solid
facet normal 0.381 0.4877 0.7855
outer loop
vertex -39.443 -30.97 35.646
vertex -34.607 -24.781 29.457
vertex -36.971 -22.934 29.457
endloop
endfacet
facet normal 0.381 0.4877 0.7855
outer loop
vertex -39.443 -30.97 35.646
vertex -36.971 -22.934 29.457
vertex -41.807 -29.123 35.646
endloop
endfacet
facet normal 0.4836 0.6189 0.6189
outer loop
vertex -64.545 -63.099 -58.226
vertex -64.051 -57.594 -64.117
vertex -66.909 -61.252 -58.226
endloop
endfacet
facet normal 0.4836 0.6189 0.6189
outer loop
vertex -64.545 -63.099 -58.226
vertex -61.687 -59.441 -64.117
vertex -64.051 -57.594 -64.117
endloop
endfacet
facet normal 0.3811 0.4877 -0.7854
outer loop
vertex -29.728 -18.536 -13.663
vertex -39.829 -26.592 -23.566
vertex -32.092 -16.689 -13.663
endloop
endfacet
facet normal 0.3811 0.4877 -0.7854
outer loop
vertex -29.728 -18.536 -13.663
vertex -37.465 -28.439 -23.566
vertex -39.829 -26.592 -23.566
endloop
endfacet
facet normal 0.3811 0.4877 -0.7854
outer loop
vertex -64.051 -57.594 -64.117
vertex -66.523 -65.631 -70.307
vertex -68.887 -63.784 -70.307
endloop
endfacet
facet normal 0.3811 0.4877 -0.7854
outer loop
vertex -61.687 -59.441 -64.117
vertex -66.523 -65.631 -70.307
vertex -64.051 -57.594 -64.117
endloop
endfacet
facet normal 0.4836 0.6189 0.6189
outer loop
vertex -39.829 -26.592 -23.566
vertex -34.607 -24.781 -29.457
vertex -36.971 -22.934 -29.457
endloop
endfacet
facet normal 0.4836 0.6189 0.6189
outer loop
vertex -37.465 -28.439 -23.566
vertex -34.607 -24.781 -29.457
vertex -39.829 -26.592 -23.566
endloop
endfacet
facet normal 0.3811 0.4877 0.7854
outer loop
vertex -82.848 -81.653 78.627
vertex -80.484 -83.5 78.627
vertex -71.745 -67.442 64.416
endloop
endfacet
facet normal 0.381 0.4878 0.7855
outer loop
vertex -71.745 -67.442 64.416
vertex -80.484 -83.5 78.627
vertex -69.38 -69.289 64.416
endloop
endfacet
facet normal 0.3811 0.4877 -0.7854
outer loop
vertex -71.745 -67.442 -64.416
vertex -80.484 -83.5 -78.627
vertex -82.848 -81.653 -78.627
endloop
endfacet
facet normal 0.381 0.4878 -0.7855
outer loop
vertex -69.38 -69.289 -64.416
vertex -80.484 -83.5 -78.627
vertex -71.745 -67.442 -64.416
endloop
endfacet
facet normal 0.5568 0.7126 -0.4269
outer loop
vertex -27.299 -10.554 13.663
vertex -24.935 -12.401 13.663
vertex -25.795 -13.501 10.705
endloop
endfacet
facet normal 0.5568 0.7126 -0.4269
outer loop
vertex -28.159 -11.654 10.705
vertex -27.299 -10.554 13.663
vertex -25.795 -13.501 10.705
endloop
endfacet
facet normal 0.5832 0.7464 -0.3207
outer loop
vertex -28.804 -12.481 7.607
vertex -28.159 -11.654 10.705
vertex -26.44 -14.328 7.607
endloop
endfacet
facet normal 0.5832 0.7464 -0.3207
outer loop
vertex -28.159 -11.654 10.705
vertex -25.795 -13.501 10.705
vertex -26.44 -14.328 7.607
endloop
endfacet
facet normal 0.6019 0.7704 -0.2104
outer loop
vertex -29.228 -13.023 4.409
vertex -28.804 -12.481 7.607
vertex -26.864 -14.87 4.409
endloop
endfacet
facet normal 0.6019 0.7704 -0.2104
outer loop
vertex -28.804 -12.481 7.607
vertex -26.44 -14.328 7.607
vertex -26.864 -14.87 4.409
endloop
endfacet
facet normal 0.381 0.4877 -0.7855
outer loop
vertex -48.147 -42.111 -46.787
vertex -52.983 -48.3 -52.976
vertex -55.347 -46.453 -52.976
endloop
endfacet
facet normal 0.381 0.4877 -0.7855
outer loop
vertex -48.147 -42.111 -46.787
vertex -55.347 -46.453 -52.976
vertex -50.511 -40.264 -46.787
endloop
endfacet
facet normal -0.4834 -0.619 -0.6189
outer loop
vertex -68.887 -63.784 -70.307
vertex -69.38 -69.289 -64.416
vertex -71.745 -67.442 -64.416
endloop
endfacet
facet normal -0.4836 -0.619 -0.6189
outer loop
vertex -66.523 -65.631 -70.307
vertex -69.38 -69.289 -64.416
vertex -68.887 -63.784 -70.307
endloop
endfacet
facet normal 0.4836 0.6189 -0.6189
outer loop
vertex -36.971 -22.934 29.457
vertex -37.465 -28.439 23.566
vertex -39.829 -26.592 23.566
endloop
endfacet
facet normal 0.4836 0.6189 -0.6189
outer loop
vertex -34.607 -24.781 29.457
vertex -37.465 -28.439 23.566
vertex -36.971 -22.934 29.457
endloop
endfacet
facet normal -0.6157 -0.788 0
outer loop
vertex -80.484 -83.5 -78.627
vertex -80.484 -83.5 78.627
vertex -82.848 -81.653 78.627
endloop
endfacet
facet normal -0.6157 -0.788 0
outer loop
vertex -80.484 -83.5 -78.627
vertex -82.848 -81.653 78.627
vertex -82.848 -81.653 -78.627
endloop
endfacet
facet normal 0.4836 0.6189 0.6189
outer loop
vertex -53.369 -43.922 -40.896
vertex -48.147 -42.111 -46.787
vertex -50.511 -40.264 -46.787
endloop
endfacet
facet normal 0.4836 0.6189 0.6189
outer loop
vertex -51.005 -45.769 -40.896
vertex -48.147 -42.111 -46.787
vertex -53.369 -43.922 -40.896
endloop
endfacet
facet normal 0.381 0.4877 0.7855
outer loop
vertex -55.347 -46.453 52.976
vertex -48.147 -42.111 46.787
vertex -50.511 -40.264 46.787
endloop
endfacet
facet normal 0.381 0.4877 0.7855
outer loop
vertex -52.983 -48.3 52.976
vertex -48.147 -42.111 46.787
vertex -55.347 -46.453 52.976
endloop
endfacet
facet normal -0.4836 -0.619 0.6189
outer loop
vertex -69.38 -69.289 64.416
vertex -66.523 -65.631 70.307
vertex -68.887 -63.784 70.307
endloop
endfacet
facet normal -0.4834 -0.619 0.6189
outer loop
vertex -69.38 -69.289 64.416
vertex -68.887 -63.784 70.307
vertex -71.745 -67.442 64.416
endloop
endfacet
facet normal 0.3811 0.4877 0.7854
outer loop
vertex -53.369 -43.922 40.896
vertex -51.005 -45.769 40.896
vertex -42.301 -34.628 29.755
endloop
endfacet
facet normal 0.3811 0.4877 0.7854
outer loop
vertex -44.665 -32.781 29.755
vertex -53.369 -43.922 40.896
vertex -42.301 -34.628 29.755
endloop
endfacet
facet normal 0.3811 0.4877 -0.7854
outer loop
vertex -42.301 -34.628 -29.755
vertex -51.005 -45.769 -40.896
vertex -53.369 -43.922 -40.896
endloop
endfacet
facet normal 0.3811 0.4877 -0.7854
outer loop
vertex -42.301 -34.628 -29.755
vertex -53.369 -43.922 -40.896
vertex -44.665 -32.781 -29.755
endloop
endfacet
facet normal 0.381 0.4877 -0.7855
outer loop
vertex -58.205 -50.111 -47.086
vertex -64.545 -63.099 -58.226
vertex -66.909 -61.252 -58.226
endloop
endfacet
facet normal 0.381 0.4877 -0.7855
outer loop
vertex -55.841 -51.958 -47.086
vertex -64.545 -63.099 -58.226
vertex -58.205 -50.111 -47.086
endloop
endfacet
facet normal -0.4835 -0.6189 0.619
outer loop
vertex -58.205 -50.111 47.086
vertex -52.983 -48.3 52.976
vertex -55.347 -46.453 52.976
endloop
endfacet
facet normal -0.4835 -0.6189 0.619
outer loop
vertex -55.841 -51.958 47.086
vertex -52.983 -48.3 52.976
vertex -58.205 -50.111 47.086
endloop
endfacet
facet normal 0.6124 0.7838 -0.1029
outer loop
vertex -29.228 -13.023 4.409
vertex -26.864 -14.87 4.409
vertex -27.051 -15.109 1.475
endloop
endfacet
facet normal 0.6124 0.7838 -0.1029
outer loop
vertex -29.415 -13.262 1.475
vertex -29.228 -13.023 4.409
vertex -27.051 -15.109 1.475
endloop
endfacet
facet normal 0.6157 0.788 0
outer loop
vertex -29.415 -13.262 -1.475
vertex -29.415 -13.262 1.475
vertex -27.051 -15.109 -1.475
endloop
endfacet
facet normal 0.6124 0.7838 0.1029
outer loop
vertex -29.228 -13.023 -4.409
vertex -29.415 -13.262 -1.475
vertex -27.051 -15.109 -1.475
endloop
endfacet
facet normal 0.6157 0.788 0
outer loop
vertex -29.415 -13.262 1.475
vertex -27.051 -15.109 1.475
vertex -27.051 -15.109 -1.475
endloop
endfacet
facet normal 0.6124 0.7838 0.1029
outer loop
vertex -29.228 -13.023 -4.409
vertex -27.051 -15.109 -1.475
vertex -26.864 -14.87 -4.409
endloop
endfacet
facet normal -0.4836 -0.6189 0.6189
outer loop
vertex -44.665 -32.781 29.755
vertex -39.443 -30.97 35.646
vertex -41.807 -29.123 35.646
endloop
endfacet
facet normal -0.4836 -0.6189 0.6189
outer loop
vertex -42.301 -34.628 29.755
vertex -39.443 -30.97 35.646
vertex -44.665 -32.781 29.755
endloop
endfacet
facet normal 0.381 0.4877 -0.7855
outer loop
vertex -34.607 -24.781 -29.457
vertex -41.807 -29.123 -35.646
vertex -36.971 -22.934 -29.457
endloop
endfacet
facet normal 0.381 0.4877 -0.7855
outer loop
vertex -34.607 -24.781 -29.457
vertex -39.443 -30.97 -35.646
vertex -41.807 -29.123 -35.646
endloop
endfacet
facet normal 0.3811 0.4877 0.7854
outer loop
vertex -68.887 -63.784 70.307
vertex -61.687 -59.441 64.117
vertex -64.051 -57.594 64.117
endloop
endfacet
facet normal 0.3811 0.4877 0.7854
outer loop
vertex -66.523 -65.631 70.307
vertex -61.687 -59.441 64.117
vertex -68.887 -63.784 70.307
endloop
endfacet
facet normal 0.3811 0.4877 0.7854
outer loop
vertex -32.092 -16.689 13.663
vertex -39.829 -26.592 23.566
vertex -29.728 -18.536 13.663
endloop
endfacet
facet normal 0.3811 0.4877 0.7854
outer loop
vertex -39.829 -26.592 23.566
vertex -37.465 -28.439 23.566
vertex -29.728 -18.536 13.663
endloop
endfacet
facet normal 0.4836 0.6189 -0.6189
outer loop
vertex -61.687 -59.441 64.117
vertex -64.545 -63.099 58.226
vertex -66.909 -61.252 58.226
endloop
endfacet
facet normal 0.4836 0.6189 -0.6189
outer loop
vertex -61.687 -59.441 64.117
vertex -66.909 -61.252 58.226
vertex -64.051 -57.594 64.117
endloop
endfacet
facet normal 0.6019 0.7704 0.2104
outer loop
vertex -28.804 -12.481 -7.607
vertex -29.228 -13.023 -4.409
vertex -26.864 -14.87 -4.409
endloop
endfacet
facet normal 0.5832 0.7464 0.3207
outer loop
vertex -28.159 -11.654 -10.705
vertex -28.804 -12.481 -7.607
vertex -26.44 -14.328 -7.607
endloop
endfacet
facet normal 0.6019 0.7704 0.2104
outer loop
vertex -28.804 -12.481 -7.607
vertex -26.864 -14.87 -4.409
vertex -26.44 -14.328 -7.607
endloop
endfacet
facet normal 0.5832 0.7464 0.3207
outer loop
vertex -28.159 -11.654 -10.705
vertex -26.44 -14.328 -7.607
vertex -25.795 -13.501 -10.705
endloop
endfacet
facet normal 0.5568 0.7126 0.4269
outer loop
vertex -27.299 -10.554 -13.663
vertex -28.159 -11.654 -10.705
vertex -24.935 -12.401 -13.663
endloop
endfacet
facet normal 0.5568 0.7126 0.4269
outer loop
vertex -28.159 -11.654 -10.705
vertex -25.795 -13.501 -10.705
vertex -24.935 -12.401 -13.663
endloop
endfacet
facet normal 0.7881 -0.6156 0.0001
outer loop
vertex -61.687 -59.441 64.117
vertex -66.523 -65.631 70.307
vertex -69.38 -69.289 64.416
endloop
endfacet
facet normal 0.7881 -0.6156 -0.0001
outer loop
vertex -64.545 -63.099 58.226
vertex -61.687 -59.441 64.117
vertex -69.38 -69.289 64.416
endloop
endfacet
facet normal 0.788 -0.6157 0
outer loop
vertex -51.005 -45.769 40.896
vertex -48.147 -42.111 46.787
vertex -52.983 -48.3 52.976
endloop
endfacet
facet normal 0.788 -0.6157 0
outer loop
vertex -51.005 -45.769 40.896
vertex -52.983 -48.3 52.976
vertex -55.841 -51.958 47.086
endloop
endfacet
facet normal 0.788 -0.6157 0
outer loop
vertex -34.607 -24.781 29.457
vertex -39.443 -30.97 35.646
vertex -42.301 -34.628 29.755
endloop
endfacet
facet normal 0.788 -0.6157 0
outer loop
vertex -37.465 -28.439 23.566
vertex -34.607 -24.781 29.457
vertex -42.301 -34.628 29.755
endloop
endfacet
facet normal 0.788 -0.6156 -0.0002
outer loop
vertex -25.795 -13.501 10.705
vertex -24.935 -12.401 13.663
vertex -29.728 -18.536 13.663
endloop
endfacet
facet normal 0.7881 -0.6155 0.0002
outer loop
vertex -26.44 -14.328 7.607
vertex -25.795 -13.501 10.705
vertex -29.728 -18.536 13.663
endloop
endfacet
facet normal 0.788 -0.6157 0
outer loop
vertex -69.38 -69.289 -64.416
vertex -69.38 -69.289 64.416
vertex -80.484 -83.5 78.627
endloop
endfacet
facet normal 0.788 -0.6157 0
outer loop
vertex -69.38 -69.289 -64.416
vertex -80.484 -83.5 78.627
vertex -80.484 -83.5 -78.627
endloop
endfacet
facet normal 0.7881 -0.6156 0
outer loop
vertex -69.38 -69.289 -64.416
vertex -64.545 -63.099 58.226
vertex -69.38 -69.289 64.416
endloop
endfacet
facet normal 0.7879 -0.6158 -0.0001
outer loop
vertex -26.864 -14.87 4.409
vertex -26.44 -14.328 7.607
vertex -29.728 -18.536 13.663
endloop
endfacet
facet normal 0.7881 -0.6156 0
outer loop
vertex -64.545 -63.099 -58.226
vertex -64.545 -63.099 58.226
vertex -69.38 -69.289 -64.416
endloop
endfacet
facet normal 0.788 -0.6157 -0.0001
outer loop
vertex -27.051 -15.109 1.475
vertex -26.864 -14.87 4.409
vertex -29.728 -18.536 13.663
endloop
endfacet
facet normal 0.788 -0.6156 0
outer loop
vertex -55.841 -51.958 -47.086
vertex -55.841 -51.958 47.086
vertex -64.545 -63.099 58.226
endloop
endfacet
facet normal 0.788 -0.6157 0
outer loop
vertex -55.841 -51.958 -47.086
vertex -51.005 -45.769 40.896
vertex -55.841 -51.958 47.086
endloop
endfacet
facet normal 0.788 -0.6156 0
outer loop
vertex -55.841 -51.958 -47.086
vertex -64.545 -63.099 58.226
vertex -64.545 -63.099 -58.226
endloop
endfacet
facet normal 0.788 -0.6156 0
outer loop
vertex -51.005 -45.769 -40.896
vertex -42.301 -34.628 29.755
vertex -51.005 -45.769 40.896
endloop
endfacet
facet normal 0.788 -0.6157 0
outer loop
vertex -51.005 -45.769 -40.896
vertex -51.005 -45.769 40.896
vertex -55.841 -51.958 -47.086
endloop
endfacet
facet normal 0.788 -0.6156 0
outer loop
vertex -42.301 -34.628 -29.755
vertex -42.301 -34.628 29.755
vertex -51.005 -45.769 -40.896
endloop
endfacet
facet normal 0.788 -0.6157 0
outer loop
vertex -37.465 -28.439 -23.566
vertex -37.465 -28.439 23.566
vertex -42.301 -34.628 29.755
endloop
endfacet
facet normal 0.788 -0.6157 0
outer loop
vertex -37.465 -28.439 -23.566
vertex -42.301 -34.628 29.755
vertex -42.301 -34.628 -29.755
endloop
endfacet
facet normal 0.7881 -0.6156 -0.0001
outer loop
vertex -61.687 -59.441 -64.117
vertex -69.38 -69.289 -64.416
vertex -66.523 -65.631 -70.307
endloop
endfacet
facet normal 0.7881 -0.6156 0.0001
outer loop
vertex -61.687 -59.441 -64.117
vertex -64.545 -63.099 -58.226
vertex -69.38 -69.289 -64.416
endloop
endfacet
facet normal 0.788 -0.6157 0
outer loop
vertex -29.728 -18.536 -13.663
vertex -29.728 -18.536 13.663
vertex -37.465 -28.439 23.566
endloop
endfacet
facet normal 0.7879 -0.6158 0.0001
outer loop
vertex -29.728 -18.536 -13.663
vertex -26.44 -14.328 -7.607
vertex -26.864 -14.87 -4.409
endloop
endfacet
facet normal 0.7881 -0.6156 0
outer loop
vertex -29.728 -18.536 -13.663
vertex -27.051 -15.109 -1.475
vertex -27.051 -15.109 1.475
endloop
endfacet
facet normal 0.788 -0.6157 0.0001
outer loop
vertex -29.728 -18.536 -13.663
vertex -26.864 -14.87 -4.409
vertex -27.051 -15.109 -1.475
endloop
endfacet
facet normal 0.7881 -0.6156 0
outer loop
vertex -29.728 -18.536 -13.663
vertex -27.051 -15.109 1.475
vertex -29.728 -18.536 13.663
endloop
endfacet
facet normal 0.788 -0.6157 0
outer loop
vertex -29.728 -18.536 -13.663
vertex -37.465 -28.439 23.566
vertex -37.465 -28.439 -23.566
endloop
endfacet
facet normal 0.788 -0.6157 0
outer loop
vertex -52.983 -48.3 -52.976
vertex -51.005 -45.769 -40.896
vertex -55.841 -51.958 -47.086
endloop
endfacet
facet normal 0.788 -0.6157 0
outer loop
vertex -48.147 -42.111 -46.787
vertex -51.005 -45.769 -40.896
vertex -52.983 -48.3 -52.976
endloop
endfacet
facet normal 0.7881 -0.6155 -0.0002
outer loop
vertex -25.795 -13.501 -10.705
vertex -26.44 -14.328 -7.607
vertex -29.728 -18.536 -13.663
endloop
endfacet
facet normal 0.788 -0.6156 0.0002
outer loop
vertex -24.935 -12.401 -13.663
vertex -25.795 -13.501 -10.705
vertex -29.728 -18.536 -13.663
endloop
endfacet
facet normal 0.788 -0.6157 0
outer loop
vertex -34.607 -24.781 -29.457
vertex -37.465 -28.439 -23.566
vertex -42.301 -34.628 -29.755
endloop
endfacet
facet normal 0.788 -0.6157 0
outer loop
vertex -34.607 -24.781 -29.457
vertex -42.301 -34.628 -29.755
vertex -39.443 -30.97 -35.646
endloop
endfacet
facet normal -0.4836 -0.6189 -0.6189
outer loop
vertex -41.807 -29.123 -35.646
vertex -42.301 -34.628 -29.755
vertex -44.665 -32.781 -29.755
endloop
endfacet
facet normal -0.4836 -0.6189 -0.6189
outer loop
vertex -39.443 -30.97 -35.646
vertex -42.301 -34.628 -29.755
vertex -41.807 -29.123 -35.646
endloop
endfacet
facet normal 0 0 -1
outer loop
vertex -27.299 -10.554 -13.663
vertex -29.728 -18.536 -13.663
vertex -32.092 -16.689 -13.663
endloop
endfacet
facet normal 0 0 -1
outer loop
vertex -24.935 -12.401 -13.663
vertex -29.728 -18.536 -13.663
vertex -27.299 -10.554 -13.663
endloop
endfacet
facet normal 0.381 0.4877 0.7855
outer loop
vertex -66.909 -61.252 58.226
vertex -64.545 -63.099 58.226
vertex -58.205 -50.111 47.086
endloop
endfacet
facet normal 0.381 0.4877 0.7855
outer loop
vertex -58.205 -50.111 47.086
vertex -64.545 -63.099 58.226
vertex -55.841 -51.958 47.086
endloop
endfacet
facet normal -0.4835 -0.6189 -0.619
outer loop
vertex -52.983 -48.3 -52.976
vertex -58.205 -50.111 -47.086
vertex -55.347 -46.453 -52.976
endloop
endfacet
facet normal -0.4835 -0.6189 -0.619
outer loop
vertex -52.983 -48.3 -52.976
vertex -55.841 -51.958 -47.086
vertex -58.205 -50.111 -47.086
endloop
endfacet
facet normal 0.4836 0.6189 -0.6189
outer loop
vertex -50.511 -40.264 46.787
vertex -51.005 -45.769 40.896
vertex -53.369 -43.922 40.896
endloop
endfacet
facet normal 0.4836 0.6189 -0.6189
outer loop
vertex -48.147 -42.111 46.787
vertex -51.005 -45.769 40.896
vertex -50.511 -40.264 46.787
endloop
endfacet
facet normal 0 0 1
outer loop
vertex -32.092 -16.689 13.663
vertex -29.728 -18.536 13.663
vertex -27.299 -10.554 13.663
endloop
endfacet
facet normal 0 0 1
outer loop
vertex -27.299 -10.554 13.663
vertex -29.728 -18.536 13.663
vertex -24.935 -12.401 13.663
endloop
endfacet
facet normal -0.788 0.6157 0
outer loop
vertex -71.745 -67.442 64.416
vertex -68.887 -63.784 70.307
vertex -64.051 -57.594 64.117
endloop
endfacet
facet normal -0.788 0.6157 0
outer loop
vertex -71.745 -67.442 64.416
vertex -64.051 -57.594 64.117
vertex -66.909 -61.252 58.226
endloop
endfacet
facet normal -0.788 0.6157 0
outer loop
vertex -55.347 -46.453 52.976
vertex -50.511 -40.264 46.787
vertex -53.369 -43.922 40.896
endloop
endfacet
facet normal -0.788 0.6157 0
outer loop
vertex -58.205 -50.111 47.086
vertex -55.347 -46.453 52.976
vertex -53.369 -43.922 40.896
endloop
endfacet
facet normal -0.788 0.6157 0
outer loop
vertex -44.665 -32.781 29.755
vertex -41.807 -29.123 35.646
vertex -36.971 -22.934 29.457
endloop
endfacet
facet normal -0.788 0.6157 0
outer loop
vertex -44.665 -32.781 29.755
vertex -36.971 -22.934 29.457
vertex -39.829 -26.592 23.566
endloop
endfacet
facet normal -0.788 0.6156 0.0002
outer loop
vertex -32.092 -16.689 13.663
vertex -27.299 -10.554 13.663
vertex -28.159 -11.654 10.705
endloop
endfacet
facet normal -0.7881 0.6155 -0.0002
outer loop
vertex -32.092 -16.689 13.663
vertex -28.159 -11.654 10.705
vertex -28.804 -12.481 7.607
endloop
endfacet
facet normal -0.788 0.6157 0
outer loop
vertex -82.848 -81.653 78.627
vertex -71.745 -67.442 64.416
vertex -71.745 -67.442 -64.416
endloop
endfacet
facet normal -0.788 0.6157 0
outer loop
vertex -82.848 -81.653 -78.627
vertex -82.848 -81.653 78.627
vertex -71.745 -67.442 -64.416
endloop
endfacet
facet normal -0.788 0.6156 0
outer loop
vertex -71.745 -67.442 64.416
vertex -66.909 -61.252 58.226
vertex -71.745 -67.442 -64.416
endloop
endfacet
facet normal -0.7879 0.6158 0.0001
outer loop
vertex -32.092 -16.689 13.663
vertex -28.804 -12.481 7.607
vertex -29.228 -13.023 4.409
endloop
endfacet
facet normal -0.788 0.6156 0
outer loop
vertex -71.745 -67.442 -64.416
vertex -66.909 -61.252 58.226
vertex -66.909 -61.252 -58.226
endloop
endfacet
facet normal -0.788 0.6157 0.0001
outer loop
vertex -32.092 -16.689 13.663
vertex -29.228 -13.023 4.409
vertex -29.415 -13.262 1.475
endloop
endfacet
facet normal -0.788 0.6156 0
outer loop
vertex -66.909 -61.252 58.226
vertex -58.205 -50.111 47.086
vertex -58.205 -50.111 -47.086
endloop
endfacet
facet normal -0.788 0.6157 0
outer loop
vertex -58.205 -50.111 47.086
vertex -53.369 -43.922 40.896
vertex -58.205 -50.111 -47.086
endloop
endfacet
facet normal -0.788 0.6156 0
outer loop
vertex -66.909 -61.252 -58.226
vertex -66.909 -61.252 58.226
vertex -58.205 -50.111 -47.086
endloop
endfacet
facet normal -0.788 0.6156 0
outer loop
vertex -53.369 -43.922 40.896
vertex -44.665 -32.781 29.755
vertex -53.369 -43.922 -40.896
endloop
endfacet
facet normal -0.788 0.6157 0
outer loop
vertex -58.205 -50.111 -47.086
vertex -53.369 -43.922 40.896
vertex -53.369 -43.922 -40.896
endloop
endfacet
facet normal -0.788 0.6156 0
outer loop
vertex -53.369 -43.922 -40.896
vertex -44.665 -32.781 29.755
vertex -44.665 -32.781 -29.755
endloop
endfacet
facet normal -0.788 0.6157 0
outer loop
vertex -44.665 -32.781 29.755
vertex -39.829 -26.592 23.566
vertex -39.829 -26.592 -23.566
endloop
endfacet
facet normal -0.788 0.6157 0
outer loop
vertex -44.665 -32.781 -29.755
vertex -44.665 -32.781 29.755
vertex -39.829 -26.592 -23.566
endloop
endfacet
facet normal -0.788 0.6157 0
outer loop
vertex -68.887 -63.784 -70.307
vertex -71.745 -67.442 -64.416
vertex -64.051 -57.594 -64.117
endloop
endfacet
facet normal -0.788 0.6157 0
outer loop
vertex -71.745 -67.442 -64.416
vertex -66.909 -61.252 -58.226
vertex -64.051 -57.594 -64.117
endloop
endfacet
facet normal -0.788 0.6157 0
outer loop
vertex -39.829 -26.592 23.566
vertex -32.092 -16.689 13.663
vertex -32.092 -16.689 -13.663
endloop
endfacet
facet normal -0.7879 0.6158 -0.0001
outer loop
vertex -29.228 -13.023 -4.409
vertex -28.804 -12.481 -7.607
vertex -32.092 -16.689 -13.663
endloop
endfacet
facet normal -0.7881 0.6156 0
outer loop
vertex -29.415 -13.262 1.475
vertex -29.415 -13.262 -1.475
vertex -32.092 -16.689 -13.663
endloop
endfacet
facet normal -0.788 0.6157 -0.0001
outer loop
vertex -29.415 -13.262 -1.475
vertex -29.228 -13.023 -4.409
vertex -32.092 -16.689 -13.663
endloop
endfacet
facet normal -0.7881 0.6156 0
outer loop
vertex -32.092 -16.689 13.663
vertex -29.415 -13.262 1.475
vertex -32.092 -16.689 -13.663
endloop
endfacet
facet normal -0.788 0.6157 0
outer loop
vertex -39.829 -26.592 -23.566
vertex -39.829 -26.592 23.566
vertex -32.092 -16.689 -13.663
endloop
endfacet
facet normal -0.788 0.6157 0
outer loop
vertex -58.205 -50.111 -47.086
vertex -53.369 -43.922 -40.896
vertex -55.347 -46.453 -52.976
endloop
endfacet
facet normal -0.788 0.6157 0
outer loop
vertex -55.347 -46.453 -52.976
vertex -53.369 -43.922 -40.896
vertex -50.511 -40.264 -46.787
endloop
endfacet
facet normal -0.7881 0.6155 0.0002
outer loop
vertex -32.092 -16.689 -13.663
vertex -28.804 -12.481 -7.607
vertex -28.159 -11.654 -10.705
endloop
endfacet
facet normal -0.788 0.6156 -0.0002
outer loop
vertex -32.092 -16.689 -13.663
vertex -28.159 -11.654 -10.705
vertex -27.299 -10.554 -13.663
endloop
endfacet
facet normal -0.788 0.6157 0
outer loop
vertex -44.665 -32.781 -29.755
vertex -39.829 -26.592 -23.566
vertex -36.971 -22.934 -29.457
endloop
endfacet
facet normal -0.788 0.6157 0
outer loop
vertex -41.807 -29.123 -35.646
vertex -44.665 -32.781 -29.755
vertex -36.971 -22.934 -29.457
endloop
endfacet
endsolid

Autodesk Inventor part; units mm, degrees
ref_plane "YZ Plane" through (0, 0, 0) normal (1, 0, 0) x (0, 1, 0)
ref_plane "XZ Plane" through (0, 0, 0) normal (0, 1, 0) x (-1, 0, 0)
sketch "Sketch1" plane through (0, 0, 0) normal (0, 0, 1) x (1, 0, 0)
  line L0 (-27.3641, -15.51) -> (-92.3641, -98.7062)
  line L1 (-26.8641, -15.51) -> (-26.8641, 15.51) projected
  line L2 (-26.8641, -15.51) -> (-27.3641, -15.51) construction
  line L3 (-54.6593, -71.0586) -> (-64.6593, -63.2457)
  point P0 (0, 0)
  dimension "d0" = 0.5
  dimension "d1" = 38
  dimension "d2" = 65
  dimension "d3" = 10
  dimension "d4" = 45
ref_plane "Work Plane1" through (-64.6593, -63.2457, 0) normal (-0.788, 0.6157, 0) x (-0.6157, -0.788, 0)
sketch "Sketch3" plane through (-64.6593, -63.2457, 0) normal (-0.788, 0.6157, 0) x (-0.6157, -0.788, 0)
  line L0 (25.703, 78.6272) -> (-56.7377, 13.663)
  line L1 (-60.5775, 15.51) -> (-60.5775, 13.663) construction
  line L2 (-56.7377, 13.663) -> (-60.5775, 13.663)
  line L3 (-60.5775, 13.663) -> (-60.5775, 0)
  line L4 (25.703, 78.6272) -> (-56.7377, 13.663)
  line L5 (-56.7377, 13.663) -> (-60.5775, 15.51) construction
  line L6 (-60.5775, 15.51) -> (25.703, 83.5) construction
  line L7 (25.703, 78.6272) -> (25.703, 0)
  line L8 (-89.6466, 0) -> (36.1638, 0) construction
  line L9 (25.703, 83.5) -> (25.703, 78.6272) construction
  line L10 (25.703, -78.6272) -> (-56.7377, -13.663)
  line L11 (-56.7377, -13.663) -> (-60.5775, -13.663)
  line L12 (-60.5775, -13.663) -> (-60.5775, 0)
  line L13 (25.703, -78.6272) -> (25.703, 0)
  point P0 (0, 0)
extrude "Extrusion1" add sketch "Sketch3" along normal blind 3
sketch "Sketch4" plane through (-64.6593, -63.2457, 0) normal (0.788, -0.6157, 0) x (0, 0, -1)
  line L0 (-78.6272, -25.703) -> (-13.663, 56.7377) projected
  line L1 (-23.566, 44.1706) -> (-29.4568, 48.8126)
  line L2 (-29.4568, 48.8126) -> (-35.6462, 40.9582)
  line L3 (-35.6462, 40.9582) -> (-29.7554, 36.3162)
  line L4 (-13.663, 60.5775) -> (13.663, 60.5775) construction
  line L5 (-78.6272, -25.703) -> (-13.663, 56.7377) construction
  line L6 (-52.9764, 18.9659) -> (-47.0856, 14.3238)
  line L7 (-46.787, 26.8203) -> (-52.9764, 18.9659)
  line L8 (-40.8962, 22.1783) -> (-46.787, 26.8203)
  line L9 (-70.3066, -3.0265) -> (-64.4158, -7.6685)
  line L10 (-64.1172, 4.8279) -> (-70.3066, -3.0265)
  line L11 (-58.2264, 0.1859) -> (-64.1172, 4.8279)
  point P0 (0, 89.6466)
  point P1 (-47.0856, 14.3238)
  point P2 (-40.8962, 22.1783)
  dimension "d10" = 7.5
  dimension "d11" = 10
  dimension "d13" = 16
  dimension "d16" = 28
extrude "Extrusion2" add sketch "Sketch4" against normal up to surface (3 mm away)
mirror "Mirror1" about plane through (0, 0, 0) normal (0, 0, 1) of "Extrusion2"
sketch "Sketch6" plane through (-64.6593, -63.2457, 0) normal (0.788, -0.6157, 0) x (0, 0, -1)
  arc A0 (4.4093, 61.3896) -> (-4.4093, 61.3896) centre (0, 89.6466) ccw
  ellipse E0 centre (0, 80.26) end of major axis (0, 60.5775) minor radius 15.51 (4.4093, 61.3896) -> (11.5479, 67.1205) ccw construction
  arc A1 (11.5479, 67.1205) -> (-11.5479, 67.1205) centre (0, 89.6466) ccw construction
  ellipse E1 centre (0, 80.26) end of major axis (0, 60.5775) minor radius 15.51 (-11.5479, 67.1205) -> (-4.4093, 61.3896) ccw construction
  line L0 (-13.663, 56.7377) -> (-13.663, 60.5775) projected
  line L1 (-13.663, 60.5775) -> (-13.663, 64.5225)
  line L2 (13.663, 60.5775) -> (13.663, 56.7377) projected
  line L3 (13.663, 60.5775) -> (13.663, 64.5225)
  circle A2 centre (0, 89.6466) radius 28.5989
  line L4 (-13.663, 60.5775) -> (13.663, 60.5775) projected
  point P0 (0, 89.6466)
  point P1 (4.4093, 61.3896)
  point P2 (-4.4093, 61.3896)
extrude "Extrusion3" add sketch "Sketch6" against normal up to surface (3 mm away) contours A0 L3 L4 L1 A2
properties part number "Tolva_Corto"
